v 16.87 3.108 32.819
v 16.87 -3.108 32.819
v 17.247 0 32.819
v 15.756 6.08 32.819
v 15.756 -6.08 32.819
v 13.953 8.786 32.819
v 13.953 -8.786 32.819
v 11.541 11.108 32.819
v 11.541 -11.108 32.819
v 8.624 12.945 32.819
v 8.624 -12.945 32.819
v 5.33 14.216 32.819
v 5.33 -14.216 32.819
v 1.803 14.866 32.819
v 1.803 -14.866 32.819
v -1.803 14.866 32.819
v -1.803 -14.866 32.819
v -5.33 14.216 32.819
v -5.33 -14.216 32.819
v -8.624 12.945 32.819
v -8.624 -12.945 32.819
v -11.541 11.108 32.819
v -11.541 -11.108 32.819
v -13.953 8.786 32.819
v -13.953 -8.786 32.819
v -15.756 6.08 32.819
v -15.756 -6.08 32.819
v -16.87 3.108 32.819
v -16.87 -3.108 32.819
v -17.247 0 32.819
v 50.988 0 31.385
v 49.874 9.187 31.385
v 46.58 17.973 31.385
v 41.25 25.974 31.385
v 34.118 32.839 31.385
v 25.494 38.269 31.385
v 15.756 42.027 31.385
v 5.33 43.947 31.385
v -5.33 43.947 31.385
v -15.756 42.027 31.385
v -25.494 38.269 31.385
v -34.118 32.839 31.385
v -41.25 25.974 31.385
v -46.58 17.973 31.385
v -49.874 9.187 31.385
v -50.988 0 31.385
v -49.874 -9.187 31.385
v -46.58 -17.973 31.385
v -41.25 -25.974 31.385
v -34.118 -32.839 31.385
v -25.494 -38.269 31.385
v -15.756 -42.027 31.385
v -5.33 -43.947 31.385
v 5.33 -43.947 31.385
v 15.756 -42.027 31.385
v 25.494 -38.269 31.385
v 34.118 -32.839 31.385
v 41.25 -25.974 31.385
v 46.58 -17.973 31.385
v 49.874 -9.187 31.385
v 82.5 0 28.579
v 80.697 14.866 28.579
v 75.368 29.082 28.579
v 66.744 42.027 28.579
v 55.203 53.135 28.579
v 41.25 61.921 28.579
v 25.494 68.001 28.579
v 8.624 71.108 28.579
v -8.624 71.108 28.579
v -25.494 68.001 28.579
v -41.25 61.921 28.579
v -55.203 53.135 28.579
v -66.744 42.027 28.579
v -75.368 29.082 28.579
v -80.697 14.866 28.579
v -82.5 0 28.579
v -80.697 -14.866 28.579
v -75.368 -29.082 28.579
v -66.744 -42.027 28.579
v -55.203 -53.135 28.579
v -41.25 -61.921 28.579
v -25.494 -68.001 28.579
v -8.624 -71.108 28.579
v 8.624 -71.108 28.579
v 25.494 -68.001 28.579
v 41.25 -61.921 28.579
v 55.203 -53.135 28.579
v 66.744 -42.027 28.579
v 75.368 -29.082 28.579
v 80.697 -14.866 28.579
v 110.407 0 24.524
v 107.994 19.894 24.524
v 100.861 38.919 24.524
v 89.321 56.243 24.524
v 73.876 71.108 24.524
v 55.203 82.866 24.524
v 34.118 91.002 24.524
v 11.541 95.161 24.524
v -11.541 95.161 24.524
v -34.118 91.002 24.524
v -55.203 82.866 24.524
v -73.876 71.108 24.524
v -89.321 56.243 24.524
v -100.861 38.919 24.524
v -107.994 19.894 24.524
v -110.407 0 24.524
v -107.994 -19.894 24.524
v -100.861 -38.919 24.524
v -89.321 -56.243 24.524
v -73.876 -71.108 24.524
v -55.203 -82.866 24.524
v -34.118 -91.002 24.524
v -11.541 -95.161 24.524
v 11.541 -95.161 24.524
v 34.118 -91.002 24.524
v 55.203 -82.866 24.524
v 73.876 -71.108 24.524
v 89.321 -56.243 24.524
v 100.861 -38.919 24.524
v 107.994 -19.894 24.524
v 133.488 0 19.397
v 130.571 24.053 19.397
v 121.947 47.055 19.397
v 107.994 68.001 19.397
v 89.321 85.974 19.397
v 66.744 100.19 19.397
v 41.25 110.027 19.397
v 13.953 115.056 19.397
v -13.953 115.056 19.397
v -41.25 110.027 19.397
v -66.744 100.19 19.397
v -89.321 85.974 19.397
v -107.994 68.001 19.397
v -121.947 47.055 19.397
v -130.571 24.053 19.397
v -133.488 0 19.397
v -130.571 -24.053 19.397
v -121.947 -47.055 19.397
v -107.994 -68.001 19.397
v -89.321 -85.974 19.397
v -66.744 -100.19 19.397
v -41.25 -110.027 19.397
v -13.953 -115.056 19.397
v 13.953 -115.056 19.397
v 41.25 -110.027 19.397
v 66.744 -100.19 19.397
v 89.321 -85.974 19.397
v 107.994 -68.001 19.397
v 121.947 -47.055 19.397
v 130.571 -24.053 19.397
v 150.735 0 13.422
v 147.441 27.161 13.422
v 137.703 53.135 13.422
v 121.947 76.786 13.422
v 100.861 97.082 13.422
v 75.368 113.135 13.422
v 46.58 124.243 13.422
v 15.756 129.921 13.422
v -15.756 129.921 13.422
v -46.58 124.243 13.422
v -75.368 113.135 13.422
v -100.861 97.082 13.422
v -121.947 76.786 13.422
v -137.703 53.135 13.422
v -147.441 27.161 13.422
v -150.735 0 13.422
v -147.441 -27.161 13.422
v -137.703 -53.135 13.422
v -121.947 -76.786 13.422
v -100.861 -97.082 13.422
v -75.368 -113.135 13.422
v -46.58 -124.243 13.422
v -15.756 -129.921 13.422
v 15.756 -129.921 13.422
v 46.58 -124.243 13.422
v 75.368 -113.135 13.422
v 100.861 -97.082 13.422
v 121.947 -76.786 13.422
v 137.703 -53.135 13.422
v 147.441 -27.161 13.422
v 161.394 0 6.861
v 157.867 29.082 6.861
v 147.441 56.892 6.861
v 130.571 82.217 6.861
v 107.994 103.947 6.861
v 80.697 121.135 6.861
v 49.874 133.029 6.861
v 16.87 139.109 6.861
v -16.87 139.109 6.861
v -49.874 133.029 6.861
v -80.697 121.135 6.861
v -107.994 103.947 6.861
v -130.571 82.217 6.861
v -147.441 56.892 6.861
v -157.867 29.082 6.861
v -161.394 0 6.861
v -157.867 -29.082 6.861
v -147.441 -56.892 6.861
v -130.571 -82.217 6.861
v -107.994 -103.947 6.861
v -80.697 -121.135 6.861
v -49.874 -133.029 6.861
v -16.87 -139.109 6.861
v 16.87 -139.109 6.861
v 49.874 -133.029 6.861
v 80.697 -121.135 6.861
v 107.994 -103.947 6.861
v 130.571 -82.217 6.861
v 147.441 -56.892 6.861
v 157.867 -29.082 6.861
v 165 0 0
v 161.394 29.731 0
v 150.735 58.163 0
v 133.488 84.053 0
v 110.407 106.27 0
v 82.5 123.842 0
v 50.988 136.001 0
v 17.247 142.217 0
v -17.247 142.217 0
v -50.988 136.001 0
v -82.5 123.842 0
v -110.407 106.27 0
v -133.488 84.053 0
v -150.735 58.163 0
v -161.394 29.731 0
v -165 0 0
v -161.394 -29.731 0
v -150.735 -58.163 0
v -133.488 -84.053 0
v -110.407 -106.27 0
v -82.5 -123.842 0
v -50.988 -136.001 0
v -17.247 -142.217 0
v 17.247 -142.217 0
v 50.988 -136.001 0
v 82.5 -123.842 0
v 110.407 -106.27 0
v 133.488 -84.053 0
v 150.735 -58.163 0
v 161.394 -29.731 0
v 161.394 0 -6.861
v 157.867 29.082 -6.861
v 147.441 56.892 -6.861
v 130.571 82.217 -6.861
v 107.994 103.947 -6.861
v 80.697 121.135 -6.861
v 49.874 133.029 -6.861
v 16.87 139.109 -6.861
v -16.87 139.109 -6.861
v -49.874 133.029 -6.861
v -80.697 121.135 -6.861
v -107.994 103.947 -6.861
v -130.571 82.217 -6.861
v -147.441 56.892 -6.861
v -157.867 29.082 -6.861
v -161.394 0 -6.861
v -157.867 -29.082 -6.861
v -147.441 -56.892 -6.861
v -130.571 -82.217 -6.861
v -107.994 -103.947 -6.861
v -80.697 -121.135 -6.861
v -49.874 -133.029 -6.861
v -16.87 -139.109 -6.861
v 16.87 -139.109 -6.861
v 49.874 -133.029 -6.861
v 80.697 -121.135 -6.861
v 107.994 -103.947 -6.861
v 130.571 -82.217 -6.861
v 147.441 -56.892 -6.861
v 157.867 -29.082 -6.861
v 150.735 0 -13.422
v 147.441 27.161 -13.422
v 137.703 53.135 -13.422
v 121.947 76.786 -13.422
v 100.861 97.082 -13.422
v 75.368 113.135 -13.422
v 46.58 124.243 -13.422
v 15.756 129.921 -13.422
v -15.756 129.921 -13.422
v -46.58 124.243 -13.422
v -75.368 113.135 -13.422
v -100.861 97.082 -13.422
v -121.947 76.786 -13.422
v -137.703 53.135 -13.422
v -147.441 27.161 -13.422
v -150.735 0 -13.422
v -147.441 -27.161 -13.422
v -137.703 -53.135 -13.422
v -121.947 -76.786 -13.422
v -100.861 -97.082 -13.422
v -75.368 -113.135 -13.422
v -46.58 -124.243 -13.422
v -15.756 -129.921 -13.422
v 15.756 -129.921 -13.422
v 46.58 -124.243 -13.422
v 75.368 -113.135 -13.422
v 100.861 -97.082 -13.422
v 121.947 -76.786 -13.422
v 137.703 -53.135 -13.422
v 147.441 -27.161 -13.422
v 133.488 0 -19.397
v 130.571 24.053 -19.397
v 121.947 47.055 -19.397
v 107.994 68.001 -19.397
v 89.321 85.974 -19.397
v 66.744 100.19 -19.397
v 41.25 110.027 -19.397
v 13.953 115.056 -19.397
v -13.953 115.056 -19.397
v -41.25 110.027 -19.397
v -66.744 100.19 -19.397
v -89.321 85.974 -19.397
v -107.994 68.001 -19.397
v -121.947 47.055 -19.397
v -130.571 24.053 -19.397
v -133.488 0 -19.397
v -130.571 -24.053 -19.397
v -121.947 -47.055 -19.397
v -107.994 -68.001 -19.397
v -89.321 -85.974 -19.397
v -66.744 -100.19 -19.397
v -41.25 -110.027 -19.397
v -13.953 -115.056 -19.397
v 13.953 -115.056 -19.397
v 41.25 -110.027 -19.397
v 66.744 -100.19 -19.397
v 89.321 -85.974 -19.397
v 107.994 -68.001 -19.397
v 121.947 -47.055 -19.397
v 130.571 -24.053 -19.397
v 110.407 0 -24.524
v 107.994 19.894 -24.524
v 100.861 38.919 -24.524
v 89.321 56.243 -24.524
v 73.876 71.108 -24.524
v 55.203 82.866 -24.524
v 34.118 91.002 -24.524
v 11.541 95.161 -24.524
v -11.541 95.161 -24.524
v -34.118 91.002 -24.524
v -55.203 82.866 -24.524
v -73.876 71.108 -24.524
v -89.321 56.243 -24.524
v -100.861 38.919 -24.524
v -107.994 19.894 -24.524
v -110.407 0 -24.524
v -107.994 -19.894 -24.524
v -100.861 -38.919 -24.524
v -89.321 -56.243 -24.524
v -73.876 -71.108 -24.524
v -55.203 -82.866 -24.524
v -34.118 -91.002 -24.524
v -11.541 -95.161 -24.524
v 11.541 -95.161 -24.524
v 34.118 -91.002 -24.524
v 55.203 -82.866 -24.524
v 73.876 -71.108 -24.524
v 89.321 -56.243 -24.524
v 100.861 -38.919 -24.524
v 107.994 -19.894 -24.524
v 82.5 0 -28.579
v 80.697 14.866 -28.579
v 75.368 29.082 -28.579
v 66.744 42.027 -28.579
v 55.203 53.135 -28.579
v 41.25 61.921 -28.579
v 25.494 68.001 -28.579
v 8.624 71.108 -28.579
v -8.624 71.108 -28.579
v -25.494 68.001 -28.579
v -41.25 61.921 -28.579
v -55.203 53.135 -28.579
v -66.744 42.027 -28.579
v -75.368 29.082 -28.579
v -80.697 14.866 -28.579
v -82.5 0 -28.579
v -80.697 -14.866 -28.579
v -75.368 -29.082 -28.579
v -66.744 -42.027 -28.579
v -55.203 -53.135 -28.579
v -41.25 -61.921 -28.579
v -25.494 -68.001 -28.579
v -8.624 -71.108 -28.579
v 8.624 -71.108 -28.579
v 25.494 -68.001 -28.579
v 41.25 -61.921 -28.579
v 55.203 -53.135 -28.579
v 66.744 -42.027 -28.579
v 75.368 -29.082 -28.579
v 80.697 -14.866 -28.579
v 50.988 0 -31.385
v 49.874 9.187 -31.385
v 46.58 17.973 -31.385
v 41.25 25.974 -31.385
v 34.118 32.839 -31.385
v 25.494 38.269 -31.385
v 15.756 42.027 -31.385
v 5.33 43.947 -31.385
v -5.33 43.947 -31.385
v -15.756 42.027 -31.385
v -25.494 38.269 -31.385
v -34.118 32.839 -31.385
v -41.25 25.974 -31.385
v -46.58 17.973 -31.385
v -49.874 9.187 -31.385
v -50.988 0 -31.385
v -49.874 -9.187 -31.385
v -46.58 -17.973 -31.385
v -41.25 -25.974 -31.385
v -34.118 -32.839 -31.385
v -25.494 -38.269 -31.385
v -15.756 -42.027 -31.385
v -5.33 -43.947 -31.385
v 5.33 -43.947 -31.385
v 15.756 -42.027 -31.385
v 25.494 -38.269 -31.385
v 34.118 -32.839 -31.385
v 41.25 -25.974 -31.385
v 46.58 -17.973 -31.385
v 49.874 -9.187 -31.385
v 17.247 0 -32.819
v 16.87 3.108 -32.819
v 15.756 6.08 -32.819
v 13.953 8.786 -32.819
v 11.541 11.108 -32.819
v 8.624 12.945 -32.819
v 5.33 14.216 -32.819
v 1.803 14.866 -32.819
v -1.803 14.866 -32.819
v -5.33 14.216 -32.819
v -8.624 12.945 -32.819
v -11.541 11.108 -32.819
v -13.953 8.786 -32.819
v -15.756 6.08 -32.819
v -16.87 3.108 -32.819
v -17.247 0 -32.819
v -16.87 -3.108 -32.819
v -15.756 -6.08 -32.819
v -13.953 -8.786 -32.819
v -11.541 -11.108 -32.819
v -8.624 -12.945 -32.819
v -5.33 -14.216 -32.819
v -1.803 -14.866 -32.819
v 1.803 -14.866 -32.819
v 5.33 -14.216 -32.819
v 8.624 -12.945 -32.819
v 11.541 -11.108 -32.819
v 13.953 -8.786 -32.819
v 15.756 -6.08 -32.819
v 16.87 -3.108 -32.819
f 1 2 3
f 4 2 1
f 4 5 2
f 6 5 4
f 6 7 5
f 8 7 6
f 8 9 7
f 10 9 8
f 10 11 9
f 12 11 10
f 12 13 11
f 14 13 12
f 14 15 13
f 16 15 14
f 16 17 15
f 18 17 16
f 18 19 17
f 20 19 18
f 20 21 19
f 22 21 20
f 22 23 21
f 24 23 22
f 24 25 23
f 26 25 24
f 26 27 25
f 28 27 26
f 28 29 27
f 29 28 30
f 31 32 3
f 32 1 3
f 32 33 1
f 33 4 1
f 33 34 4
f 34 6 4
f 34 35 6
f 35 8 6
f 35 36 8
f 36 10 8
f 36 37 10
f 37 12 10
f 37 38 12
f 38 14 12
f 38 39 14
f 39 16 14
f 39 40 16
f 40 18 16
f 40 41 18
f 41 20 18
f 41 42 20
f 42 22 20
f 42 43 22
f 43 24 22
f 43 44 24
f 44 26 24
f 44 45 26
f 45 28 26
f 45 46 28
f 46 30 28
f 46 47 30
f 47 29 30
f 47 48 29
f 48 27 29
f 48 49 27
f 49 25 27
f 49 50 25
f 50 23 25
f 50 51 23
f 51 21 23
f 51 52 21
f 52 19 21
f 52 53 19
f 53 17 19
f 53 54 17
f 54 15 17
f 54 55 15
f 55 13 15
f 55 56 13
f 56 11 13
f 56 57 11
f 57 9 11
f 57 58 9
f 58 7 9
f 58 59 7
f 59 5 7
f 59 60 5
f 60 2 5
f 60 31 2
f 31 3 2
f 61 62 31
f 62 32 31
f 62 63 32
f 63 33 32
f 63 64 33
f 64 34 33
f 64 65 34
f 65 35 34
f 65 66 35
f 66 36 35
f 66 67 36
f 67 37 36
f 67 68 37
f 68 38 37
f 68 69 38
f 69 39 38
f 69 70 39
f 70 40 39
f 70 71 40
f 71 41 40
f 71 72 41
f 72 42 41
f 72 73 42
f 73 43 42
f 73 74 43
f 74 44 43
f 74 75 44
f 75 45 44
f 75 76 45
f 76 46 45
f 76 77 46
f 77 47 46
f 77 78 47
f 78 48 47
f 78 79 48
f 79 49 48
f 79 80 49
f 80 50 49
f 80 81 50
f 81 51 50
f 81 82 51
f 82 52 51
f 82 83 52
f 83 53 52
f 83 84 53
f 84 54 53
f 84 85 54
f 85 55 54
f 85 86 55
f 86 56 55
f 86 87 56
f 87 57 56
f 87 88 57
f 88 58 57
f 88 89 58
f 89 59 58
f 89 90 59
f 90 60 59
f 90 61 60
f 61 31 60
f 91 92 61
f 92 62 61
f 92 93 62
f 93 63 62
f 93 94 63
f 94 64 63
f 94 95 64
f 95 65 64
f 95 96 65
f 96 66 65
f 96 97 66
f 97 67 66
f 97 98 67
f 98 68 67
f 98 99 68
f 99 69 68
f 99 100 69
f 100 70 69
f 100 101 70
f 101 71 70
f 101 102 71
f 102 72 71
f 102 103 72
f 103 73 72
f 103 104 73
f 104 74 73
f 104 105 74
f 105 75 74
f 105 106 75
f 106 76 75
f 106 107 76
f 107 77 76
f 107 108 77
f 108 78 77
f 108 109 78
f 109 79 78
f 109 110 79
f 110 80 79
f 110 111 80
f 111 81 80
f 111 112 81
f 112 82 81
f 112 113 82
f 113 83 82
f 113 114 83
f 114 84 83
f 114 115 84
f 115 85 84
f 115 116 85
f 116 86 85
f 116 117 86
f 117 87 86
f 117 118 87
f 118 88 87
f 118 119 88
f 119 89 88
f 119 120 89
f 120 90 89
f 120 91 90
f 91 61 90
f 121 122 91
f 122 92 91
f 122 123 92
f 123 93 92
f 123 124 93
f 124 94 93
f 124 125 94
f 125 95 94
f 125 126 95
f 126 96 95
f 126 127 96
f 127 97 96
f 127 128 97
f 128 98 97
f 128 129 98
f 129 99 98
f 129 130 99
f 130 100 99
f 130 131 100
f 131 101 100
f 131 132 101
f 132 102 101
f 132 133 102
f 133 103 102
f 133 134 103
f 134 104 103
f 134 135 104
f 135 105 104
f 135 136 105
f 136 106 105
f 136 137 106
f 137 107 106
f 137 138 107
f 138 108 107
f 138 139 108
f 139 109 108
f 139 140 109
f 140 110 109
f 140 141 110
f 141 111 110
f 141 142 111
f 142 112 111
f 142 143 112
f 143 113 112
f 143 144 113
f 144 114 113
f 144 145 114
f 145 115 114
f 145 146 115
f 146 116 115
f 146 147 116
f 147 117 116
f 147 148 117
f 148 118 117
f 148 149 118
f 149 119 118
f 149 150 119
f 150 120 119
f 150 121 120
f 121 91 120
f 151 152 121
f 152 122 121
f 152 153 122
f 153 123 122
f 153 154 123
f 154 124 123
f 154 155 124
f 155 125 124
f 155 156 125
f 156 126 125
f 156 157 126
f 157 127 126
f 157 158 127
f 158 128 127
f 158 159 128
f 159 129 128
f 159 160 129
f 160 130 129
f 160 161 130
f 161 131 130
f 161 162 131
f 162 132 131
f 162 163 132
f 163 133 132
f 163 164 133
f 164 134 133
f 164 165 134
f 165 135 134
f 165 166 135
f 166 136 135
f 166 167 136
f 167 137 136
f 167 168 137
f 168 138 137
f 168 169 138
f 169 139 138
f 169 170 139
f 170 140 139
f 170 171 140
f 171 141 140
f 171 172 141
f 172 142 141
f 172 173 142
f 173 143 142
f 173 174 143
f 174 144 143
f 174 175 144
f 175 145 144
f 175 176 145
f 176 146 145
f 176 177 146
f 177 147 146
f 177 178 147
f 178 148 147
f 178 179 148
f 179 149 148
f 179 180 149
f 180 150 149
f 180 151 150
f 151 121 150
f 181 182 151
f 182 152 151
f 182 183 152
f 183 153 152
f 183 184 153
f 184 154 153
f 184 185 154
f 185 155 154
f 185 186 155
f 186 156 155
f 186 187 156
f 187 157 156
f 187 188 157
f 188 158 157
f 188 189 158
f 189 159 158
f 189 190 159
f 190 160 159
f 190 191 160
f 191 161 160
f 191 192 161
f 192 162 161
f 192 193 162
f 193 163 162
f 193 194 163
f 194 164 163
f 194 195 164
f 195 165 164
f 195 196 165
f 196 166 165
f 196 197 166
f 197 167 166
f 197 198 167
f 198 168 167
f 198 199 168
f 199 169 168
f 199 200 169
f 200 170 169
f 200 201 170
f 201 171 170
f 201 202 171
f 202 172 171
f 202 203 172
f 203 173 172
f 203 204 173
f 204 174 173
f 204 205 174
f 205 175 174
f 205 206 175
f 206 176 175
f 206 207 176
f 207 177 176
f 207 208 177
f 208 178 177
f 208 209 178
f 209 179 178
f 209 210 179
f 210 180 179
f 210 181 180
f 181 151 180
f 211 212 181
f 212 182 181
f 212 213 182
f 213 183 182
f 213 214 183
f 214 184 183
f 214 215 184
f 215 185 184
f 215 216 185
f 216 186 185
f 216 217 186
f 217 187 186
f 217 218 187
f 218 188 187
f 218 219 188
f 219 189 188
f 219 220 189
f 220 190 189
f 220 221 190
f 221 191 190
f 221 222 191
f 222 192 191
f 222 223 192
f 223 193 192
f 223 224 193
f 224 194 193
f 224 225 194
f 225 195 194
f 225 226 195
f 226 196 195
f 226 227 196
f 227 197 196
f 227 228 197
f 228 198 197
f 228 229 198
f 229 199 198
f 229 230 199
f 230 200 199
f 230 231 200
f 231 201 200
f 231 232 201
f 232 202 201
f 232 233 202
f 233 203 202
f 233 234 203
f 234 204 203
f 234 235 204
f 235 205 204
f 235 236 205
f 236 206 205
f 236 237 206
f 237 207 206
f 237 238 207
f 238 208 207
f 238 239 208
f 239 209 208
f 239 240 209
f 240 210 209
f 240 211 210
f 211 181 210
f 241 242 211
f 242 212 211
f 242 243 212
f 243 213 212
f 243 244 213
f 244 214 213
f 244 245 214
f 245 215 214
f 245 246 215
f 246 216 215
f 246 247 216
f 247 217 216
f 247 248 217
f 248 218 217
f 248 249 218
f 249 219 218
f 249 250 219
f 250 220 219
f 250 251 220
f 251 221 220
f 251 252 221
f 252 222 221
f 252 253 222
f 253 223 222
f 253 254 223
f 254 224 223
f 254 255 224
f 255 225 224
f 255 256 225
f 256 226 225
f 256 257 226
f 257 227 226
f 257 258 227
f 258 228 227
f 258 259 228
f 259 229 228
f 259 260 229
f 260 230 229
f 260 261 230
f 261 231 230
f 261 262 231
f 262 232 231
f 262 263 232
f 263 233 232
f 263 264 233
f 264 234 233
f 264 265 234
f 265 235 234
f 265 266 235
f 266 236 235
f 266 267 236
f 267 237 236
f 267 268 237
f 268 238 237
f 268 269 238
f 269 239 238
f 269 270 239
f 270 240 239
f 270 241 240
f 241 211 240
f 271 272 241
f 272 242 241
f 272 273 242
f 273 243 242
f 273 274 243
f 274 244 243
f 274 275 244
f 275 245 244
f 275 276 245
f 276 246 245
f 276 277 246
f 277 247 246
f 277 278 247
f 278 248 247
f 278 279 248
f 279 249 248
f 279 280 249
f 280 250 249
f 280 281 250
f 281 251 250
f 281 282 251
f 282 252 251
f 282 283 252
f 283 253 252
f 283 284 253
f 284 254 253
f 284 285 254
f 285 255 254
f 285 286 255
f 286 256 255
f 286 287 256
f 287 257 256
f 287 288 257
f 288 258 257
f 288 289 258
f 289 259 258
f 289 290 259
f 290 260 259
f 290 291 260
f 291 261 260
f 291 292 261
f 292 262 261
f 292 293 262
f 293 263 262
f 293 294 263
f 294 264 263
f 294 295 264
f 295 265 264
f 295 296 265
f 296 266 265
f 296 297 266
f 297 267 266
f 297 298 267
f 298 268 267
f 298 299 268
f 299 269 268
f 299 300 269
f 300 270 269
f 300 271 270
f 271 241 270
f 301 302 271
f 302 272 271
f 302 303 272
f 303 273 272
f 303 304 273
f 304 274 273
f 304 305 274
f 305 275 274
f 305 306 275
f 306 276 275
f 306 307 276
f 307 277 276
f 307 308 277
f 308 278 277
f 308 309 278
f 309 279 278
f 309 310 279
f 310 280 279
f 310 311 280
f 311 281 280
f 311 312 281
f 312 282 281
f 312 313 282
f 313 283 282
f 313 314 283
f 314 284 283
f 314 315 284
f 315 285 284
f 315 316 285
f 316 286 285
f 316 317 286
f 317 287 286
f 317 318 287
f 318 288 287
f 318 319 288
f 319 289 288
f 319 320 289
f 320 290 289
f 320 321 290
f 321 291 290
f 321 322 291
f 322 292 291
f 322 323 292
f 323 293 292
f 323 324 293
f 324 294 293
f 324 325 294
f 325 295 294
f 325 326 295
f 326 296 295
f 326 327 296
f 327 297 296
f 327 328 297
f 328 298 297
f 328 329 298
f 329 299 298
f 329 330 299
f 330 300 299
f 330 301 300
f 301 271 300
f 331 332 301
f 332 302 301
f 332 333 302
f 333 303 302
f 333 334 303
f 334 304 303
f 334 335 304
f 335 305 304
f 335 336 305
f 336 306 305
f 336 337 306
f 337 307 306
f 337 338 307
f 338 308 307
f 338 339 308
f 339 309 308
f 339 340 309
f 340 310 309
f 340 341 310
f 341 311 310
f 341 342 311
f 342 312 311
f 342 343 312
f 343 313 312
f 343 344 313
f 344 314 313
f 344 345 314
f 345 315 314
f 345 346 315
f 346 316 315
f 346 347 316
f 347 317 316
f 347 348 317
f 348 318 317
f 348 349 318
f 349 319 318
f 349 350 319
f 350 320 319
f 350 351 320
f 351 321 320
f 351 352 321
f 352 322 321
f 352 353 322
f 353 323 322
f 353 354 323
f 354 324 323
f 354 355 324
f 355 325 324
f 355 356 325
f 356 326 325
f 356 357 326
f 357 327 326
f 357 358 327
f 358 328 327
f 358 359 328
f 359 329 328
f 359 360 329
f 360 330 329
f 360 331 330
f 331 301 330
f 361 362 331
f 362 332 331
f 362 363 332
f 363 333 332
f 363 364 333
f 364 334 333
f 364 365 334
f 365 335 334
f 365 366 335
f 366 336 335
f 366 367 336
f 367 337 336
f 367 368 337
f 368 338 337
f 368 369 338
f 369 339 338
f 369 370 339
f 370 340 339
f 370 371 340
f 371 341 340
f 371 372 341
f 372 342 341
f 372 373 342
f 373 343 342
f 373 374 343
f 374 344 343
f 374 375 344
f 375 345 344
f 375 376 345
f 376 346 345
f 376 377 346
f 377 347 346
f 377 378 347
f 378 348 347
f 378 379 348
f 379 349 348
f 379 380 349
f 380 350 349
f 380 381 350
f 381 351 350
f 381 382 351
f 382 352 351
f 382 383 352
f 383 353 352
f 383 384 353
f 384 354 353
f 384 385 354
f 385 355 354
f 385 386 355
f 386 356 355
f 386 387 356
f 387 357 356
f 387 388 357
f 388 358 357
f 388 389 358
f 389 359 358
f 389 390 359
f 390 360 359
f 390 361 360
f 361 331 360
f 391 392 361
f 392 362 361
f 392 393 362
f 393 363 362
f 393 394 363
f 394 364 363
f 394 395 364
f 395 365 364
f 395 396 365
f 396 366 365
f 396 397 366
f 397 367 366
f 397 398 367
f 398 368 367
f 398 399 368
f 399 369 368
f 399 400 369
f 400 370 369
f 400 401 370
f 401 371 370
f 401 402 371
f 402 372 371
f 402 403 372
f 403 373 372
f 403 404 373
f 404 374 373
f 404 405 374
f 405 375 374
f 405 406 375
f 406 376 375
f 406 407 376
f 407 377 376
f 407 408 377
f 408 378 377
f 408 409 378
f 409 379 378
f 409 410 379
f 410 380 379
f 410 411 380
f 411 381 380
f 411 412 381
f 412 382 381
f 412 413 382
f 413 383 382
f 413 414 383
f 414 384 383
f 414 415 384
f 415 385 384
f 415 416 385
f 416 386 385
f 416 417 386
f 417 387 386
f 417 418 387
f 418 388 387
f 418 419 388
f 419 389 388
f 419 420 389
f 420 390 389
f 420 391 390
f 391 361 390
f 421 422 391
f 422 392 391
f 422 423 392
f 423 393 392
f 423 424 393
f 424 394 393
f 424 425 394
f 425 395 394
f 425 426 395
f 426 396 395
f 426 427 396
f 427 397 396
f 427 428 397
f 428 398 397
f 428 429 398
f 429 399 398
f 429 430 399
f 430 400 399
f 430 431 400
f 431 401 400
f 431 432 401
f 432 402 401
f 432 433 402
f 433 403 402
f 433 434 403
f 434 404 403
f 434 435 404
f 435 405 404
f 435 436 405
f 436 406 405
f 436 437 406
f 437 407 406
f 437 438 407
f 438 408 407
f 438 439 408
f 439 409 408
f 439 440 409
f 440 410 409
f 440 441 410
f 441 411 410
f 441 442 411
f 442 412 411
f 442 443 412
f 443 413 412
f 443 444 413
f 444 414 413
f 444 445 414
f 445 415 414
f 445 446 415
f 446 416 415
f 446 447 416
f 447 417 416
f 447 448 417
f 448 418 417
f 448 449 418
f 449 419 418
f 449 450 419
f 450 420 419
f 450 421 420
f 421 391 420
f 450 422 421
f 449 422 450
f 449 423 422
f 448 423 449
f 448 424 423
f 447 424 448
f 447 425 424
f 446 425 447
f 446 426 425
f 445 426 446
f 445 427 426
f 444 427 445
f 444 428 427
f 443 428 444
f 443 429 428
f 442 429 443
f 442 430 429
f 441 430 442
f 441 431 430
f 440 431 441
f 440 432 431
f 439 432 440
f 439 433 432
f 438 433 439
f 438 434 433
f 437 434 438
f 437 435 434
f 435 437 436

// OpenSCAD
// Generated by SolidPython 1.0.1 on 2020-07-29 00:46:52


scale(v = [15, 13, 3]) {
	sphere(r = 11);
}
/***********************************************
*********      SolidPython code:      **********
************************************************
 
# import packages: SolidPython
from solid import *
from solid.utils import *
from itertools import chain, combinations, permutations


class Resize:

    def __init__(self, scad_file):
        self.scad_file = scad_file
        #self.scad_file = import_scad(scad_file)
        # cone/cylinder param:
        self.r1 = 0
        self.r2 = 0
        self.h = 0
        # rectangular prism param:
        self.w = 0
        self.l = 0
        # ellipse param:
        self.r = 0

    # import OpenScad code (file name corresponds to shape)


    # classify shape + parameters
    def assign(self, param1, param2, param3):
        if self.scad_file == 'cone.scad':
            self.r1 = param1
            self.r2 = param2
            self.h = param3
        elif self.scad_file == 'cylinder.scad':
            self.r1 = param1
            self.r2 = param2
            self.h = param3
        elif self.scad_file == 'rectangularPrism.scad':
            self.h = param1
            self.l = param2
            self.w = param3
        else:
            self.r = param1
            self.h = param2

    # resize parameters
    def iterate(self):
        x = range(3, 20, 2)
        i = 1
        if self.scad_file == 'cone.scad':
            tempList = list(permutations(x, 2))
            for temp in tempList:
                param1 = temp[0]
                param2 = temp[1]
                filepath = 'produced_scad_files/' + 'cone' + str(param1) + '_' + str(param2) + '_' + '.scad'
                scad_render_to_file(cylinder(h=param1, r1=param2, r2=0), filepath)

        elif self.scad_file == 'cylinder.scad':
            tempList = list(permutations(x, 3))
            for temp in tempList:
                param1 = temp[0]
                param2 = temp[1]
                filepath = 'produced_scad_files/' + 'cylinder' + str(param1) + '_' + str(param2) + '_' + '.scad'
                scad_render_to_file(cylinder(h=param1, r1=param2, r2=param2), filepath)

        elif self.scad_file == 'rectangularPrism.scad':
            tempList = list(permutations(x, 3))
            for temp in tempList:
                param1 = temp[0]
                param2 = temp[1]
                param3 = temp[2]
                filepath = 'produced_scad_files/' + 'rectangularPrism' + str(param1) + '_' + str(param2) + '_' + str(
                    param3) + '.scad'
                scad_render_to_file(cube(size=(param1, param2, param3)), filepath)

        elif self.scad_file == 'ellipse.scad':
            tempList = list(permutations(x, 4))
            for temp in tempList:
                param1 = temp[0]
                param2 = temp[1]
                param3 = temp[2]
                param4 = temp[3]
                filepath = 'produced_scad_files/' + 'ellipse' + str(param1) + '_' + str(param2) + '_' + str(param3) + '_' + str(param4) + '.scad'
                scad_render_to_file(scale([param1, param2, param3])(sphere(r=param4)), filepath)

    def render_to_scadfile(self):
        scad_render_to_file(scad, 'example.scad') 
 
************************************************/
